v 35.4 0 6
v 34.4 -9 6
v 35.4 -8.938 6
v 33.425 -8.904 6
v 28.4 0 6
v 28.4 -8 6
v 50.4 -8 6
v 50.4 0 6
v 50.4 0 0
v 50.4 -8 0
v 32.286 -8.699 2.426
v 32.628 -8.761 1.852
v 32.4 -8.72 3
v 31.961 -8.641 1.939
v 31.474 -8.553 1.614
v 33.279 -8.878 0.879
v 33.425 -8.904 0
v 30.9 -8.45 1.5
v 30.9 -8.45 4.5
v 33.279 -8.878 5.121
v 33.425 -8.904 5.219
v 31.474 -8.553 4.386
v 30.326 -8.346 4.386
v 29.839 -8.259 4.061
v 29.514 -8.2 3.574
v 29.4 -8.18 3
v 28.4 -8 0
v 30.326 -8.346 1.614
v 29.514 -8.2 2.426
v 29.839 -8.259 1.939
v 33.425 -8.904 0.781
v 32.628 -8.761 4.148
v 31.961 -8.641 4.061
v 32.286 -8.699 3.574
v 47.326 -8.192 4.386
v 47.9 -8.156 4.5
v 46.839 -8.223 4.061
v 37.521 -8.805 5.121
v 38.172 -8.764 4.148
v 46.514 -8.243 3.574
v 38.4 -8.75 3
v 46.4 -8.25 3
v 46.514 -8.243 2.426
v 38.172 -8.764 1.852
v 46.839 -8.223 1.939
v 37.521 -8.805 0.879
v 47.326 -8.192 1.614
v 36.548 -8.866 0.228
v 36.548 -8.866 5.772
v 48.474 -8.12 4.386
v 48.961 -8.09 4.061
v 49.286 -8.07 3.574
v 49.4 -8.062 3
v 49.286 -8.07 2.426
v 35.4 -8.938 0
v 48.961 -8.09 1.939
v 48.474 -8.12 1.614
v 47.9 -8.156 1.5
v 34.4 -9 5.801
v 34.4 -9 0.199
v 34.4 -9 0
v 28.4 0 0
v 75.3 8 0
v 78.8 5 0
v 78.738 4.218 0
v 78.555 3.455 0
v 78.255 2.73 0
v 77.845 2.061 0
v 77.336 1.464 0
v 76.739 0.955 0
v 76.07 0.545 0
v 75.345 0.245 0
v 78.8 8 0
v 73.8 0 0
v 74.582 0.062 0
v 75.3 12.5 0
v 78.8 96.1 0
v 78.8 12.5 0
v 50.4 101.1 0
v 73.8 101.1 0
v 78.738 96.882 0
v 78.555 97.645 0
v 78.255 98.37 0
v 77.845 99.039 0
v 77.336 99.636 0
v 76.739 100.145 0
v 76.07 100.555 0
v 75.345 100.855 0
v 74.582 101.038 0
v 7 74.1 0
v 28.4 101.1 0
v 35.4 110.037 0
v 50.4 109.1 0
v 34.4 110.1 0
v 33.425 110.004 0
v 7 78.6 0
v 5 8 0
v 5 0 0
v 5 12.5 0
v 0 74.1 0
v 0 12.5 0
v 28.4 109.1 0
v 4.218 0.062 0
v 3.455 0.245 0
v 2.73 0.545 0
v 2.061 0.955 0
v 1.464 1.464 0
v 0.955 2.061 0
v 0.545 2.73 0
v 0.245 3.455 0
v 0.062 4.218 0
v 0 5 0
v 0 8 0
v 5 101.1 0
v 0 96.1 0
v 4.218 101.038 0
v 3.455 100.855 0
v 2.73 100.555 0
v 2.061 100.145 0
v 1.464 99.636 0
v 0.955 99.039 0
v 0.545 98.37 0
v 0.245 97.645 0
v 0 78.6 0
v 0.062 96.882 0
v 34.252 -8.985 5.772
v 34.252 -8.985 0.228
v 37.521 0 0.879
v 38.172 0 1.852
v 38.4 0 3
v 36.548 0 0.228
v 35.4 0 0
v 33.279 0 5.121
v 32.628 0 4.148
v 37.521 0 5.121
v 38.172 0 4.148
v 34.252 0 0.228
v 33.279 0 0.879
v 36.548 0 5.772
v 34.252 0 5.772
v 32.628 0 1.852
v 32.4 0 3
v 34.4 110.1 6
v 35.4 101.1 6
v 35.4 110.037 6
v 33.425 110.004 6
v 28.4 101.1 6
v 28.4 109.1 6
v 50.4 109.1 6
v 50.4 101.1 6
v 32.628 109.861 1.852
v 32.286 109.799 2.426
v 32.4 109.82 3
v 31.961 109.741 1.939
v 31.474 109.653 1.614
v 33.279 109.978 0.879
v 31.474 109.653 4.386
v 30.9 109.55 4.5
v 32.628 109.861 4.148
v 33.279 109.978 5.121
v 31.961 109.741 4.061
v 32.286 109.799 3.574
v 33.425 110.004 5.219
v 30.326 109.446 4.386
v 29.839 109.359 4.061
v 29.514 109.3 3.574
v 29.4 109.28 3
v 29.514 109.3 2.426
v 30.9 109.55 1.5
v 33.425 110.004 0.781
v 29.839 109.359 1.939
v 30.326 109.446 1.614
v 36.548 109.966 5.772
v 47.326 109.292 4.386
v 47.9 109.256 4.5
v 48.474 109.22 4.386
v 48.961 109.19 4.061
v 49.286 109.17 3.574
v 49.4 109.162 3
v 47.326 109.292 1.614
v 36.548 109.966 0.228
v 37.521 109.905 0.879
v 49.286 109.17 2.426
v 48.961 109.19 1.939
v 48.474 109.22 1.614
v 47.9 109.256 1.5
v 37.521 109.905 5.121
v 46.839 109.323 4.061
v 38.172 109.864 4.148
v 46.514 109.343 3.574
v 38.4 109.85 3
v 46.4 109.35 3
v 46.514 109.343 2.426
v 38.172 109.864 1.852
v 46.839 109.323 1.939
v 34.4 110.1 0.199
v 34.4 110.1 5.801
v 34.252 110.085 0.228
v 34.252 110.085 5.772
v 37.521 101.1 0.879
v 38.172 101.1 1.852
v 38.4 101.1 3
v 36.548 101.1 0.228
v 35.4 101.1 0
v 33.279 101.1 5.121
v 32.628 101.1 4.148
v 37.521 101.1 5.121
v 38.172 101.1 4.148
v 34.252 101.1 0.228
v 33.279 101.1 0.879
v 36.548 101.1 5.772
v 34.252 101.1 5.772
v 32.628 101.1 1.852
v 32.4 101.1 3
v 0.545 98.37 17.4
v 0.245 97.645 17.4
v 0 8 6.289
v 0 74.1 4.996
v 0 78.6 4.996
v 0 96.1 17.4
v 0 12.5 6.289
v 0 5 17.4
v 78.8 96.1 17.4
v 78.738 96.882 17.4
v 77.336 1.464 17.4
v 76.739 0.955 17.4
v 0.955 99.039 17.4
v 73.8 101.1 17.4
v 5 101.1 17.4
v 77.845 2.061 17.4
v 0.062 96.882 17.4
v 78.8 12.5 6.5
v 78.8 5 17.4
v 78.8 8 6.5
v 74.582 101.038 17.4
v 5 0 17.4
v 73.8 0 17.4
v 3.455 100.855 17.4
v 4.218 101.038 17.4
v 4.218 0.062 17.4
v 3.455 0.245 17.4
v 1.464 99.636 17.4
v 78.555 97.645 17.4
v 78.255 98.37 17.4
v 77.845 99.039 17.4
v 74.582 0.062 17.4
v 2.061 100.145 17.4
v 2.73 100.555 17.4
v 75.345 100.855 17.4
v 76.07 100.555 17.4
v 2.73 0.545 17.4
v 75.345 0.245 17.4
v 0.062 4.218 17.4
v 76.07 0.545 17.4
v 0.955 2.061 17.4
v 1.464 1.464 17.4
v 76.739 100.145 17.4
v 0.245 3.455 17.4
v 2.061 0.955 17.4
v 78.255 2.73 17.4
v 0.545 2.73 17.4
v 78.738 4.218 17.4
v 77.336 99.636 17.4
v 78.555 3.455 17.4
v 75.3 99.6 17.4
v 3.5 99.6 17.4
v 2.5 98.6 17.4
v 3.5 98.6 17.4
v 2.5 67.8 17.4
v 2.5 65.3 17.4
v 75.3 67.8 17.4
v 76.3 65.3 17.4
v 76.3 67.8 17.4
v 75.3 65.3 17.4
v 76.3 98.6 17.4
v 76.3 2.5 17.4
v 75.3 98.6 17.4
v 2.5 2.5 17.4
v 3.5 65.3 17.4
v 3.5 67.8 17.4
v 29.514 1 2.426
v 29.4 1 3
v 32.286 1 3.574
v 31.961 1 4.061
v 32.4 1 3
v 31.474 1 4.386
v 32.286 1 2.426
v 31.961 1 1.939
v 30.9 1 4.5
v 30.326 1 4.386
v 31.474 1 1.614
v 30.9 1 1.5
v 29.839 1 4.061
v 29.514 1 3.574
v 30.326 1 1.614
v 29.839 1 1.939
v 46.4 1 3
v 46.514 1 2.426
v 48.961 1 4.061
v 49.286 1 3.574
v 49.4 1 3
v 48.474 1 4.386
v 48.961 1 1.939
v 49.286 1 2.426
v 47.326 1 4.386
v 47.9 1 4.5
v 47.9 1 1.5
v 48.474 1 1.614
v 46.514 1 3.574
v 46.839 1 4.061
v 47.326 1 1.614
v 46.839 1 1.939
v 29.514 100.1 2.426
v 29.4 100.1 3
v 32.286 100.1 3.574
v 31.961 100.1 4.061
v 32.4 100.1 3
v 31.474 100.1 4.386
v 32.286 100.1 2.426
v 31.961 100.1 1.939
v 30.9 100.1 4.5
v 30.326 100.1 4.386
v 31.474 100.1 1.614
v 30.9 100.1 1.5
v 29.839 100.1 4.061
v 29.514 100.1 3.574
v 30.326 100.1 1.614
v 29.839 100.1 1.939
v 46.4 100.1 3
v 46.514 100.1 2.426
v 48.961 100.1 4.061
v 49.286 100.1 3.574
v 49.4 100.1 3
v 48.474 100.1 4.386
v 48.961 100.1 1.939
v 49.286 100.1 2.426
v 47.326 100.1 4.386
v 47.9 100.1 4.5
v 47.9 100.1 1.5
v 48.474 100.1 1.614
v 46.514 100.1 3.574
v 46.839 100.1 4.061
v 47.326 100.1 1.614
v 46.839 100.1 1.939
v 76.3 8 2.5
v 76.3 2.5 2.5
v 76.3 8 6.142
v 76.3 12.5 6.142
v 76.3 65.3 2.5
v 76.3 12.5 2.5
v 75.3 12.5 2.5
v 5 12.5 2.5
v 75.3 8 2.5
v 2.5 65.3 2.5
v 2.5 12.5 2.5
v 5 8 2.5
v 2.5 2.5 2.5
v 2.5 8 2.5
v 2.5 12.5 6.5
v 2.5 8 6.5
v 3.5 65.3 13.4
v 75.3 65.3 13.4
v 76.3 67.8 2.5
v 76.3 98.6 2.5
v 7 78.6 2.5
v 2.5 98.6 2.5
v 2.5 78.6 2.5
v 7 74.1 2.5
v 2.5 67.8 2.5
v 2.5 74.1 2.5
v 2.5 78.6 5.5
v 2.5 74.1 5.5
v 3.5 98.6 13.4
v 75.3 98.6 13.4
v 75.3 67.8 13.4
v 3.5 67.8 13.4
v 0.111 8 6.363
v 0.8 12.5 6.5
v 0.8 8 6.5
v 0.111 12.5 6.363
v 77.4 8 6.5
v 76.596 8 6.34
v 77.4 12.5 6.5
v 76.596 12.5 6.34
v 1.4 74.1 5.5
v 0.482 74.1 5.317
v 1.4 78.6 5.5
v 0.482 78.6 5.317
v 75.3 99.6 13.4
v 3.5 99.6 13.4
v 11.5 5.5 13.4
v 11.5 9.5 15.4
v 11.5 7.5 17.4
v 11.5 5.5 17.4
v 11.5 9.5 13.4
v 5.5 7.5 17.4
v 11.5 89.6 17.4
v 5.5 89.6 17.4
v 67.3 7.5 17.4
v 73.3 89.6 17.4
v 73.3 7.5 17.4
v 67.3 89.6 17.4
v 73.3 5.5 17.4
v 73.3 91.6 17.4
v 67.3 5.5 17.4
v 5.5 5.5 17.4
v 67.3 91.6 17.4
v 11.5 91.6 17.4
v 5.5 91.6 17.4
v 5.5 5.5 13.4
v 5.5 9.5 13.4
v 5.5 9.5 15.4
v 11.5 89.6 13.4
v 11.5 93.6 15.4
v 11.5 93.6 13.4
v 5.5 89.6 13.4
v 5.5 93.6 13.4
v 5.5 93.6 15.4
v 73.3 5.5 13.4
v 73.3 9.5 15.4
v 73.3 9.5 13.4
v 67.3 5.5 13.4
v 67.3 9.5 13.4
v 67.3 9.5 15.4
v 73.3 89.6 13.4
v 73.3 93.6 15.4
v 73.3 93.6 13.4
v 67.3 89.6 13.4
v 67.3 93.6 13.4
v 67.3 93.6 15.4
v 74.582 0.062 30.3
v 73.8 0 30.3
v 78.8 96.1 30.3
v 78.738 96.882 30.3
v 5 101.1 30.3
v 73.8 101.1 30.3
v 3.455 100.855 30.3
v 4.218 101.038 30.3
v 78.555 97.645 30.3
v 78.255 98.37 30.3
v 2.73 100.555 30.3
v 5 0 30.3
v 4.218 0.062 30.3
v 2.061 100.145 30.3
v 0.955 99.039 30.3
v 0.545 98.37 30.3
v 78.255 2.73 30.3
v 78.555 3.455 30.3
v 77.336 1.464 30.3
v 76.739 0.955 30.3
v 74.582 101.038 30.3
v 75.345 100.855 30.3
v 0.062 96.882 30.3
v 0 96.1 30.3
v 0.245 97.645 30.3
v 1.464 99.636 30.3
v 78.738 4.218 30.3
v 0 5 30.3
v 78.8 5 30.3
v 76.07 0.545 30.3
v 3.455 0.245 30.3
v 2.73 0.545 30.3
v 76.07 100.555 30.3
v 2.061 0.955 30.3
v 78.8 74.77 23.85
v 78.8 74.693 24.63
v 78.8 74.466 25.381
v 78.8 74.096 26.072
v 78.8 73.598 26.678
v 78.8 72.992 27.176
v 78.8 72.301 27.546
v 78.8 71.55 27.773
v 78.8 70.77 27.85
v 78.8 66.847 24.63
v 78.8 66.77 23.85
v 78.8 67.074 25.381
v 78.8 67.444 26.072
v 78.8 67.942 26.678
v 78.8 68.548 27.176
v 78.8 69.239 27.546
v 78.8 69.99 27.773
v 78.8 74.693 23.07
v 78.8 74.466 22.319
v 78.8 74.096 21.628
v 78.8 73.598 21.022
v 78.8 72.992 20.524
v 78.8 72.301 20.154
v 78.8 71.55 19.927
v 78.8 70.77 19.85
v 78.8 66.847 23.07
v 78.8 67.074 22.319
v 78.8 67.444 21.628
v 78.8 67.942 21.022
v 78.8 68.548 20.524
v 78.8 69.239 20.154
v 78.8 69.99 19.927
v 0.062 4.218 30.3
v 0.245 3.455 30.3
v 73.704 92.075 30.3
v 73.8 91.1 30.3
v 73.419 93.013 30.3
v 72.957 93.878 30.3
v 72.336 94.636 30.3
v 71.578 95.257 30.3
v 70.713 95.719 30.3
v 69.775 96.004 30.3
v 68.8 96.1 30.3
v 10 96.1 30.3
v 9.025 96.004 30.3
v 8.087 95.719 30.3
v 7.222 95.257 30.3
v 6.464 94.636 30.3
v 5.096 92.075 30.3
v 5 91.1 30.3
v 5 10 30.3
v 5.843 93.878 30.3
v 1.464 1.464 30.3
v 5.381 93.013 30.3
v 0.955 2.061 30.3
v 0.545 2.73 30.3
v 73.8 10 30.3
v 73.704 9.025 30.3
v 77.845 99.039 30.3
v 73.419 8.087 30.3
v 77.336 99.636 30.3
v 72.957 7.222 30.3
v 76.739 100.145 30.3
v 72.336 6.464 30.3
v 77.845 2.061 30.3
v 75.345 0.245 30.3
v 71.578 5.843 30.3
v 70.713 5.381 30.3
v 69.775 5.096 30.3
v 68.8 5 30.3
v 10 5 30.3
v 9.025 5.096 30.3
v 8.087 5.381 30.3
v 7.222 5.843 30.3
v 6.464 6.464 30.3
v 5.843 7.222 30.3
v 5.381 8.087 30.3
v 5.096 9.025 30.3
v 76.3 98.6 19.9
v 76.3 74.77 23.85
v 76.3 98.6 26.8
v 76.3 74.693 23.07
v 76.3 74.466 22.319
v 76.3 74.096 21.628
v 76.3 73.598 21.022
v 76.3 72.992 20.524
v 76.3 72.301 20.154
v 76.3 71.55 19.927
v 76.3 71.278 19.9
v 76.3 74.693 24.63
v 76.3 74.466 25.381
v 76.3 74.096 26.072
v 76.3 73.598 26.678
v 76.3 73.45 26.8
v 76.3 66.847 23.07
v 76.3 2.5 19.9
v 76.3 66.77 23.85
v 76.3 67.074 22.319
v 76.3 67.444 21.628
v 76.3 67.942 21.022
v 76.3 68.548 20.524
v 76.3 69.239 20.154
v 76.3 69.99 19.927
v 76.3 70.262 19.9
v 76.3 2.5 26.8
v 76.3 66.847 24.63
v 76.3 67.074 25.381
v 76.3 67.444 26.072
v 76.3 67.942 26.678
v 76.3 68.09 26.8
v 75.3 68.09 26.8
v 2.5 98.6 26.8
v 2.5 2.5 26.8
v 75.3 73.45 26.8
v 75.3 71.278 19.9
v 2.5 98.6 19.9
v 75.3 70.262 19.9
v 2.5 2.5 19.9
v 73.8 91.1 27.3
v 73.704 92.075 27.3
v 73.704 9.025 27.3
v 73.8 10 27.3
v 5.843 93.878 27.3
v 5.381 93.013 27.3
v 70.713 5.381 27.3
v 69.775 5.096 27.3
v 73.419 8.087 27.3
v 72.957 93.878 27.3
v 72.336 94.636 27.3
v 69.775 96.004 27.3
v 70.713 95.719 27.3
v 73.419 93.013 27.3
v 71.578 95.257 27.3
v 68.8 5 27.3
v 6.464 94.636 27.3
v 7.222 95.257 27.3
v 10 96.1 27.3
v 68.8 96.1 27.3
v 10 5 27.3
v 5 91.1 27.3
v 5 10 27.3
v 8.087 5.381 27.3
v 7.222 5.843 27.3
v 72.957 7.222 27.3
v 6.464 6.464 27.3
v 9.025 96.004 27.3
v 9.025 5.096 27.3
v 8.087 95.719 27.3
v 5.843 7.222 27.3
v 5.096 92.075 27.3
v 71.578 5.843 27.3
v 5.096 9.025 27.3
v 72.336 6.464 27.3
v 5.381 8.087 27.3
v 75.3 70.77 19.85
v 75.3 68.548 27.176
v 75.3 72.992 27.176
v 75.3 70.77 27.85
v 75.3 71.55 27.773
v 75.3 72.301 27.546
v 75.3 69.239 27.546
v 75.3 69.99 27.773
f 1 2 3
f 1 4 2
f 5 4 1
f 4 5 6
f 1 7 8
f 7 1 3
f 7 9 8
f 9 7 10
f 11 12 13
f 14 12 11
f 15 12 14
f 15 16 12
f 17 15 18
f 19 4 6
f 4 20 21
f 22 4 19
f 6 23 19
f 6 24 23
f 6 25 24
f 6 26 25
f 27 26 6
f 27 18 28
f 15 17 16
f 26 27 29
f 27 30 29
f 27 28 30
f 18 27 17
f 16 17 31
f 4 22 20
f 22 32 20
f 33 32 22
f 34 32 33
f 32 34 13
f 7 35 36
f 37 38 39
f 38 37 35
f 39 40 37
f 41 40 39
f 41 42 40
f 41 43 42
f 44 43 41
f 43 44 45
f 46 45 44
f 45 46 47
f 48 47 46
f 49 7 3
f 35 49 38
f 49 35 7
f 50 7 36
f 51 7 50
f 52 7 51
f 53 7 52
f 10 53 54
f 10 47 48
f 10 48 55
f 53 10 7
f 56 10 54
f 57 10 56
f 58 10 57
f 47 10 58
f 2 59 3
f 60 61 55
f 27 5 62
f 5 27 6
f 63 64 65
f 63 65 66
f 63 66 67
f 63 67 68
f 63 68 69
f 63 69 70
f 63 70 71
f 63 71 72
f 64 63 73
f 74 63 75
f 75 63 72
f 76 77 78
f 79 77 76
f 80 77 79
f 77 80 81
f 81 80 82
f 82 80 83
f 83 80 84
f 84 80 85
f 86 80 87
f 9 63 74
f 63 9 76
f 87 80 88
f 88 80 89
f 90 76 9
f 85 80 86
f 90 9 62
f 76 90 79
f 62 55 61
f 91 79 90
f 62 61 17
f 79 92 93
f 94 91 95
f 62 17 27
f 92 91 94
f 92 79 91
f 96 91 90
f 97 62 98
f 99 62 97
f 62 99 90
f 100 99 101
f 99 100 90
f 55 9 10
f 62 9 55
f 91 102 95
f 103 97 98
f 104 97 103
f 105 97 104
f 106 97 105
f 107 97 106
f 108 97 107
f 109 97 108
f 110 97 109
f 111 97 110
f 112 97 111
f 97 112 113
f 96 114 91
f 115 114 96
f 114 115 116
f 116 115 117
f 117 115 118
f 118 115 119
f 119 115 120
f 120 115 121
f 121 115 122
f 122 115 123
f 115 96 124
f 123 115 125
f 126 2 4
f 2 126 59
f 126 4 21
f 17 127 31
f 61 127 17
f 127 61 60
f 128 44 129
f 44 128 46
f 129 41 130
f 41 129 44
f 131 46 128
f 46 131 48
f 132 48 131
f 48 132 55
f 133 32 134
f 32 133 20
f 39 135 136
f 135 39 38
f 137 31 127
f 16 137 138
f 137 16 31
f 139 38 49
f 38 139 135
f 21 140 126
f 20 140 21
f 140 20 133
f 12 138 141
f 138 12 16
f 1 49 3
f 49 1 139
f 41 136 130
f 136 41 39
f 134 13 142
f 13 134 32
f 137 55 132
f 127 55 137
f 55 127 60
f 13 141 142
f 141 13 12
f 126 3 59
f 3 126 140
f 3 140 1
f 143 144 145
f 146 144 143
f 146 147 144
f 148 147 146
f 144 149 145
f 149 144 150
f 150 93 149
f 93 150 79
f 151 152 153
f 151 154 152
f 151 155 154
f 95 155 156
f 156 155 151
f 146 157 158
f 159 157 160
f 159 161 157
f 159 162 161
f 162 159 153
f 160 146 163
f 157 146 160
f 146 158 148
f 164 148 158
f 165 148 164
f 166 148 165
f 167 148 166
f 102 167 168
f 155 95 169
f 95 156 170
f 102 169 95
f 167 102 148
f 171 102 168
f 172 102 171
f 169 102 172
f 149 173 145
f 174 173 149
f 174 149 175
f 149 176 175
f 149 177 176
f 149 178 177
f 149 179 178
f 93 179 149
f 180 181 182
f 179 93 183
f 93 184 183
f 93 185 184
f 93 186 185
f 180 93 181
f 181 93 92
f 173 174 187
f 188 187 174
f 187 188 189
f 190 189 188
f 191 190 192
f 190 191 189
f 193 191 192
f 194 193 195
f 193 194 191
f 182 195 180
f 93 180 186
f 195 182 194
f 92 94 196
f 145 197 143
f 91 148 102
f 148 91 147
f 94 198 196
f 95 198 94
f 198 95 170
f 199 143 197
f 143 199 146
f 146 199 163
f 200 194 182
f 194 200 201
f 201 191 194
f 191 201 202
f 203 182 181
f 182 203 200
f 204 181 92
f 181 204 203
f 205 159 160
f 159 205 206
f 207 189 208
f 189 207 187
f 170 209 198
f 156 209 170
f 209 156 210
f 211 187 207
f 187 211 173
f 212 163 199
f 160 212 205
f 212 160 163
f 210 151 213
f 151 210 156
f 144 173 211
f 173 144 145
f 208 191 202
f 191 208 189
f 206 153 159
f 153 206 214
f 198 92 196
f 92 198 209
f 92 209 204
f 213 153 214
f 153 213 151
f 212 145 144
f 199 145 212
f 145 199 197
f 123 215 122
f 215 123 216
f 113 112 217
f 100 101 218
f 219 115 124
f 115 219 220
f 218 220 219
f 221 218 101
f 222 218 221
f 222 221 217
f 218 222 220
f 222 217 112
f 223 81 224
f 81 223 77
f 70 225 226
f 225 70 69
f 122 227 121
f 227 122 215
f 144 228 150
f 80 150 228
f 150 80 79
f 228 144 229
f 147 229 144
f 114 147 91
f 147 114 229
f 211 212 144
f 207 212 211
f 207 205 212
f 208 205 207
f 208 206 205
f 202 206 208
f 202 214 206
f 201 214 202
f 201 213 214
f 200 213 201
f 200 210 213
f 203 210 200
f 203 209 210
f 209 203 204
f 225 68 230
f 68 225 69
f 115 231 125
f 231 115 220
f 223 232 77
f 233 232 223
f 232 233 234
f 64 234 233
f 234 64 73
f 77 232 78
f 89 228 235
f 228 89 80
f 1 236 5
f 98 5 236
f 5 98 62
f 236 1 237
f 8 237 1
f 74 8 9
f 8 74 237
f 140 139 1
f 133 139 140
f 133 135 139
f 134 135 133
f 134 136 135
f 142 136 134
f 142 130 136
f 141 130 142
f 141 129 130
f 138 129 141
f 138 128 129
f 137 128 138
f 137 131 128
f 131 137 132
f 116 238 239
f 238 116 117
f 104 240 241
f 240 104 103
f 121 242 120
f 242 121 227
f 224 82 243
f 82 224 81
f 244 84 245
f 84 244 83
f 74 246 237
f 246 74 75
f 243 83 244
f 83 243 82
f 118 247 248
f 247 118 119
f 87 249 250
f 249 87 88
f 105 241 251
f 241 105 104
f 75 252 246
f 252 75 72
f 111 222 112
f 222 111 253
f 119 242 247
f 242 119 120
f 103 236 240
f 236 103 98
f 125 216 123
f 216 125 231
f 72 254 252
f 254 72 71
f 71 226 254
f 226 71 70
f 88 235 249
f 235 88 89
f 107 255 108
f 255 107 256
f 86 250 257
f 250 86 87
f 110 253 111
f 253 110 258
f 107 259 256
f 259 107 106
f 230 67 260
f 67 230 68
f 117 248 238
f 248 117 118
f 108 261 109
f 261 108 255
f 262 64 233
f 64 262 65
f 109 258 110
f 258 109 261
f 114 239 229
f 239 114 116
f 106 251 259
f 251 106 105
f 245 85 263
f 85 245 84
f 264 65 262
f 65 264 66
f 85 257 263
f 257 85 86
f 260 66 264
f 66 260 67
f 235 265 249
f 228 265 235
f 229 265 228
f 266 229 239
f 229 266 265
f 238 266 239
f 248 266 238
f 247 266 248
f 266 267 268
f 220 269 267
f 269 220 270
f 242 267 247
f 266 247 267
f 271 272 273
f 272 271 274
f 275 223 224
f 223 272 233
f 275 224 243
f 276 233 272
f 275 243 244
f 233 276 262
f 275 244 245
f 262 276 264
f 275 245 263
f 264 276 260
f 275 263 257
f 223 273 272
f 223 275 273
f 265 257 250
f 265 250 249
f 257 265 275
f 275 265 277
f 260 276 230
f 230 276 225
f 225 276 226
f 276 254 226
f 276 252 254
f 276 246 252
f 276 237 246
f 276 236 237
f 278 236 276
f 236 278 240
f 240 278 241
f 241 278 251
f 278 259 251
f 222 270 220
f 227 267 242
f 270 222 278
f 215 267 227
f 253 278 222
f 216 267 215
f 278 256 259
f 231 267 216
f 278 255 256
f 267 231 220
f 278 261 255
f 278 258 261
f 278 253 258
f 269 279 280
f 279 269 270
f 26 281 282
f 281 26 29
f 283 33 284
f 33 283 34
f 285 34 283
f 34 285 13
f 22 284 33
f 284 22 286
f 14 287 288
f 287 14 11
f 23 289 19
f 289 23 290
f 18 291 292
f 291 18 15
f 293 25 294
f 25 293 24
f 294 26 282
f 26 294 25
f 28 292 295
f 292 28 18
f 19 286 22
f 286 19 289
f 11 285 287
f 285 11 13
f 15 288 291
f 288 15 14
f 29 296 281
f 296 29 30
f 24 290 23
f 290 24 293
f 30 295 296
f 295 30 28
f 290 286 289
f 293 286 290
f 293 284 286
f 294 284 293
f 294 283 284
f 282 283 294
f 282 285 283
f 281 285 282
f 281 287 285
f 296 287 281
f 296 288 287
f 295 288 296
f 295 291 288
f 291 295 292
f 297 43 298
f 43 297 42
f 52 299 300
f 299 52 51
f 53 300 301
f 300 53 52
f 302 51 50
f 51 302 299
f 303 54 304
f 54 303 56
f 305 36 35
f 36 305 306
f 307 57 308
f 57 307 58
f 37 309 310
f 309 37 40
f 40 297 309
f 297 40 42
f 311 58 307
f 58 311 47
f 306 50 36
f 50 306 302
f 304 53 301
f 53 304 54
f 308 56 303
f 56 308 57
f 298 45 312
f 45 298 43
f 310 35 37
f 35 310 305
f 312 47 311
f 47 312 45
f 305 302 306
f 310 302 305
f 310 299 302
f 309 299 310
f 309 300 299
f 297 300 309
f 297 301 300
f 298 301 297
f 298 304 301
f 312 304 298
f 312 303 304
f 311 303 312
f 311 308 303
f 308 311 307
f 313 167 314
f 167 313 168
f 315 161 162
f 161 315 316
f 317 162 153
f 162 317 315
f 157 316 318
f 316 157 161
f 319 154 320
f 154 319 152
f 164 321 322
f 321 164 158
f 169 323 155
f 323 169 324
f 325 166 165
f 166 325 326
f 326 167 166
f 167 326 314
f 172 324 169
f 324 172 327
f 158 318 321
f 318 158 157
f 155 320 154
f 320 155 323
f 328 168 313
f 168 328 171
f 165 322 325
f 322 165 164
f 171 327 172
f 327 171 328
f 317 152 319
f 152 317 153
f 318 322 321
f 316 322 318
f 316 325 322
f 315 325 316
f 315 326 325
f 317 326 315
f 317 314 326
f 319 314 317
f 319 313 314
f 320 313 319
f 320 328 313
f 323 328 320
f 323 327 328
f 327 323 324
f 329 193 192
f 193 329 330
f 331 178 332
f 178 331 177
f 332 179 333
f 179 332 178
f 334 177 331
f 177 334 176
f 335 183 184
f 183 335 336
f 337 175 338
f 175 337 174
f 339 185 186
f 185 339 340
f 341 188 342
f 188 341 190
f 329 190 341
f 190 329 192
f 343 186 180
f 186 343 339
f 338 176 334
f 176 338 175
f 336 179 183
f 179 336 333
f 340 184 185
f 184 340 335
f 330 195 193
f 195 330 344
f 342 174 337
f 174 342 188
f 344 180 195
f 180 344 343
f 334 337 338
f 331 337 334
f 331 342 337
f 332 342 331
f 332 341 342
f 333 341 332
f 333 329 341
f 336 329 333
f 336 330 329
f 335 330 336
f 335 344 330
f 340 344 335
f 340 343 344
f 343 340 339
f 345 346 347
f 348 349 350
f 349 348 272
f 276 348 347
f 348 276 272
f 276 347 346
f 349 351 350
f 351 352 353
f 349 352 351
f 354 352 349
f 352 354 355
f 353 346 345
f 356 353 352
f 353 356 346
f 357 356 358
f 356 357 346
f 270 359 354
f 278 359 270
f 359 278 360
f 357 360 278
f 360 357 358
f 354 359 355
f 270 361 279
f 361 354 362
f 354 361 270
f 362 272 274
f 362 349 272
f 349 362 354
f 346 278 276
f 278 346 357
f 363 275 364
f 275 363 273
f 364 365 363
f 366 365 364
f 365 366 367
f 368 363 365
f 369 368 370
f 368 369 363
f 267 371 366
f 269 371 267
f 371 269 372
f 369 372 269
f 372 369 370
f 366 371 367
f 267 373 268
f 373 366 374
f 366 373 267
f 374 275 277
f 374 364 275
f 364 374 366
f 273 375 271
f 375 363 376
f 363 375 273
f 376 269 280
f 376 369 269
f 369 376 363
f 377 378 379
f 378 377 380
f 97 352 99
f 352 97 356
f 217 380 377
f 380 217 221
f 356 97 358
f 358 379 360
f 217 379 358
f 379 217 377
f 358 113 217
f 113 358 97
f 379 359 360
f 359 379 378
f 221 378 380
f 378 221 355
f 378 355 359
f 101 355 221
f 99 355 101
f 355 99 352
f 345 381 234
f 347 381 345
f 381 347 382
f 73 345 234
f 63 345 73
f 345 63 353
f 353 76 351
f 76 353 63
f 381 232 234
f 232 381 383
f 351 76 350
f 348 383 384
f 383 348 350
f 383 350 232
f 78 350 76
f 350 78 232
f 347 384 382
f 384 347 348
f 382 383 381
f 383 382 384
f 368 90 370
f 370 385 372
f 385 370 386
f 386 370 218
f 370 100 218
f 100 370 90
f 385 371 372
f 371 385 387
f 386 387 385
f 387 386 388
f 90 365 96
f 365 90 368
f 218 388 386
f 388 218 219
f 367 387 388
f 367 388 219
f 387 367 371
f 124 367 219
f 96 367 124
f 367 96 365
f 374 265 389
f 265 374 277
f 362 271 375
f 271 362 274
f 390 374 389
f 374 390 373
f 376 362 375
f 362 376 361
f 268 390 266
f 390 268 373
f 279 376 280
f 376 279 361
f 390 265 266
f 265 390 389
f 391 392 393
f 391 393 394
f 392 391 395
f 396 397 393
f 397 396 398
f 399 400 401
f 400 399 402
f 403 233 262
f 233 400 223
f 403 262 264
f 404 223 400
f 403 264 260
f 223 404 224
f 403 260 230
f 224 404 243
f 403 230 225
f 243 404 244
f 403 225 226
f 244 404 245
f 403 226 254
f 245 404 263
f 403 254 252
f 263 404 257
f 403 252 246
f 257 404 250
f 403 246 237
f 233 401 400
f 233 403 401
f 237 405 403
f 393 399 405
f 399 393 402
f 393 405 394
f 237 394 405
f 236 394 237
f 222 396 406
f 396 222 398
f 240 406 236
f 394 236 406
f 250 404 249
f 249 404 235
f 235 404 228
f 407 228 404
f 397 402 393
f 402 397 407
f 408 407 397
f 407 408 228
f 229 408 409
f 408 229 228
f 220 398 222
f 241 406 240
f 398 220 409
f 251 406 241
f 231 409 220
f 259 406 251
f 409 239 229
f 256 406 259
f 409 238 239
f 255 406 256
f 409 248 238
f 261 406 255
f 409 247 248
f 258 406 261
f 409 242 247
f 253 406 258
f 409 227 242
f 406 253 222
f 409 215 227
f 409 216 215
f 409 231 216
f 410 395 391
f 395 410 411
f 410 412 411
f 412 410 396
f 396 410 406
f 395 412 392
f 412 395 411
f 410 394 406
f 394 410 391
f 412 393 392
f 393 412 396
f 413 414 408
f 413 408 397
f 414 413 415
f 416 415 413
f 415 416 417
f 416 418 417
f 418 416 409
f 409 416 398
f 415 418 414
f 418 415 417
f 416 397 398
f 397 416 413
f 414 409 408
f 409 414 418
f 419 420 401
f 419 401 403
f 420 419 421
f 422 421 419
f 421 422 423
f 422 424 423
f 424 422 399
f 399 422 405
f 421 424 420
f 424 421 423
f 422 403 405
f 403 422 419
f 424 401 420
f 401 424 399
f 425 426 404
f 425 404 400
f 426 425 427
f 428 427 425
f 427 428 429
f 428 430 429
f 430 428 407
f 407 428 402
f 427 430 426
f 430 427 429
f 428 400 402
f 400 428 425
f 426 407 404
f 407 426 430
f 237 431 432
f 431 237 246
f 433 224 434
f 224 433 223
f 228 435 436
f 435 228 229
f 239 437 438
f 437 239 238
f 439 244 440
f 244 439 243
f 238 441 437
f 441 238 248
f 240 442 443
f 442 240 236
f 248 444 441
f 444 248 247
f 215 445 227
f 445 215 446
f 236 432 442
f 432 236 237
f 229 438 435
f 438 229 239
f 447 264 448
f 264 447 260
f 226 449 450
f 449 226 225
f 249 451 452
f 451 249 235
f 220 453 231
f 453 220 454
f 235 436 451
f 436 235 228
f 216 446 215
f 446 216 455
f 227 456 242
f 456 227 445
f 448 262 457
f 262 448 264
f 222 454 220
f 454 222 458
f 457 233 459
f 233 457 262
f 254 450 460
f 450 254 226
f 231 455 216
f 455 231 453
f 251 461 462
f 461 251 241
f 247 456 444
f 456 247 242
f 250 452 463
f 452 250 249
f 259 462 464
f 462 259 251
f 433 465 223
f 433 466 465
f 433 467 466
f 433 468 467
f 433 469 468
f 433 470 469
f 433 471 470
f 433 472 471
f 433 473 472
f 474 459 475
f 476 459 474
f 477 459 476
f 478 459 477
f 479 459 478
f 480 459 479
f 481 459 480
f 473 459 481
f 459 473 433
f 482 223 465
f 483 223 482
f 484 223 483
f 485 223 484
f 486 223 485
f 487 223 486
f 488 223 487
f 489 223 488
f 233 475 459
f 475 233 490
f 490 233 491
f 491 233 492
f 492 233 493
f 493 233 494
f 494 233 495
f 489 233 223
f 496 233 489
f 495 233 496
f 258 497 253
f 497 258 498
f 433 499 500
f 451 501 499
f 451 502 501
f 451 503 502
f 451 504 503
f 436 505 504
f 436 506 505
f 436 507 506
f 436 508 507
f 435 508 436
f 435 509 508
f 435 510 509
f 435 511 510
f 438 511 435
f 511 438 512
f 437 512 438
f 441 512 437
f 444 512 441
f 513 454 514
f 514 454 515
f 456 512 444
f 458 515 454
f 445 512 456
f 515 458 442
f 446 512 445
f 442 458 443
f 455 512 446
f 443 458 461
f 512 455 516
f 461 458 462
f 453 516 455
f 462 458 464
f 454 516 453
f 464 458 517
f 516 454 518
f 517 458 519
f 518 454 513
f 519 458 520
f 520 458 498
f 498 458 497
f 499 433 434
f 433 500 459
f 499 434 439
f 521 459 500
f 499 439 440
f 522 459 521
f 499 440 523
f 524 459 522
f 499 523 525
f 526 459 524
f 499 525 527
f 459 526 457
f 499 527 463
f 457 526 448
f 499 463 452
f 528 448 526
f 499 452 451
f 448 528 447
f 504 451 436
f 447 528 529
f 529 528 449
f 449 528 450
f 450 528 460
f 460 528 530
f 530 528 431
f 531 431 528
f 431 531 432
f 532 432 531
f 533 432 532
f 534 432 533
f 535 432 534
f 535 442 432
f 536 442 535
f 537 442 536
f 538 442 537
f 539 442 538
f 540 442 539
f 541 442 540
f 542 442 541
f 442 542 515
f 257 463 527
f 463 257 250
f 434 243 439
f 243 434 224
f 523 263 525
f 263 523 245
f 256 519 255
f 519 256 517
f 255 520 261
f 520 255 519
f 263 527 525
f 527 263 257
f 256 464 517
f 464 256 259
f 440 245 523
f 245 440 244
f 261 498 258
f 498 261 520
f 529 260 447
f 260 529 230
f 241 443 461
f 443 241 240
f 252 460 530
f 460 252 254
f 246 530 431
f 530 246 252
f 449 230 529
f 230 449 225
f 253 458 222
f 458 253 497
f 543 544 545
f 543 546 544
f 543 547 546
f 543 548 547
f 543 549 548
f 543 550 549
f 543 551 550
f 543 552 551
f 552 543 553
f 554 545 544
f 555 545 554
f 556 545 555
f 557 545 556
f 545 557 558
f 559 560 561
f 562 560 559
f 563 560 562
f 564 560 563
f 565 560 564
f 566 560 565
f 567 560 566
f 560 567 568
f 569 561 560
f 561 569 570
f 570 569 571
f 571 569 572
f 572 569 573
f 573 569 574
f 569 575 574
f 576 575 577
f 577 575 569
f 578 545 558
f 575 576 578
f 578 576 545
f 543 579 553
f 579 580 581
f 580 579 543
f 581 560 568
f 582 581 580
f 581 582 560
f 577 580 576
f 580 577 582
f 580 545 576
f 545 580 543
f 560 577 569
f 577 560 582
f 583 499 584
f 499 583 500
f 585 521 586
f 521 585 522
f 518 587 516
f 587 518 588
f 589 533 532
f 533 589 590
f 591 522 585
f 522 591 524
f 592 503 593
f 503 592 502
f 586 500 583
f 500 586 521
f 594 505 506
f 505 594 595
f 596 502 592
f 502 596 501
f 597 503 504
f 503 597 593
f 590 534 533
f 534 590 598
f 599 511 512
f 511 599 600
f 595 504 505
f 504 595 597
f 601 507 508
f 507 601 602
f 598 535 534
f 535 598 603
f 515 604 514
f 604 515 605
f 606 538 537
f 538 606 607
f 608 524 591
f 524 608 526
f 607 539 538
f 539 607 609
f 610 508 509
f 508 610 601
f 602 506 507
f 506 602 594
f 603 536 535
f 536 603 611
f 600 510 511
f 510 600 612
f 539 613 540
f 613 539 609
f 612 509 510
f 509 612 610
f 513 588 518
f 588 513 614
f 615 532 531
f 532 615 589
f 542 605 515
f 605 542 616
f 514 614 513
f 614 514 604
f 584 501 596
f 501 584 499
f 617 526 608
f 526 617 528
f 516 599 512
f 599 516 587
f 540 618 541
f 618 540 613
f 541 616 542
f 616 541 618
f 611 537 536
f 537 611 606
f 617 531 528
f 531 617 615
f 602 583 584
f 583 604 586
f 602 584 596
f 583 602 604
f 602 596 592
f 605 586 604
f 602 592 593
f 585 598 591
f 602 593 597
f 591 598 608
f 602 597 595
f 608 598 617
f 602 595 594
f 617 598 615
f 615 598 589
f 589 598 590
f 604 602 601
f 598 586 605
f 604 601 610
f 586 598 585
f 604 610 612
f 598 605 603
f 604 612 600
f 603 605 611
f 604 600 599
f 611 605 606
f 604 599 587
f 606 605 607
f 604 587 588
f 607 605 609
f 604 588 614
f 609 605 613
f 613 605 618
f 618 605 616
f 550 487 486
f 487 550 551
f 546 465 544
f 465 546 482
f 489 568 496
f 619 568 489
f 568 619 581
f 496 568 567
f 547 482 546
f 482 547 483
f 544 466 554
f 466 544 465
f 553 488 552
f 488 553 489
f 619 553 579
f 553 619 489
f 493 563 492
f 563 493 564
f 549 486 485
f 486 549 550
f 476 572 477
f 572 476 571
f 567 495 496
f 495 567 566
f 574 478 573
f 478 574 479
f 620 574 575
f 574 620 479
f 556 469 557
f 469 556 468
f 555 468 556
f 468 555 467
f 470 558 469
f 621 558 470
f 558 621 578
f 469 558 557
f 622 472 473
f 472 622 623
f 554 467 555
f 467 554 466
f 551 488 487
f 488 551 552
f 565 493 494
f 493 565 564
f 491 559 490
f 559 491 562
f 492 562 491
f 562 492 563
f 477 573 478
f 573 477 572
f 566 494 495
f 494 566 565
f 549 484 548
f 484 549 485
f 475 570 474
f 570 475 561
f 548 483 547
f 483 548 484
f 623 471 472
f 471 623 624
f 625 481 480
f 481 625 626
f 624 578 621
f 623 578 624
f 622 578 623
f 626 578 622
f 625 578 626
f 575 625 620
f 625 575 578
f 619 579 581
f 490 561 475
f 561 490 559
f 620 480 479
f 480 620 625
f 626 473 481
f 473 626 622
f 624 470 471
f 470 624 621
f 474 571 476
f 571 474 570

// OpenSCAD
// ============================================================
//  GlucoFit — 워치형 통합 케이스
//  Pi Zero 2W + 보조배터리 일체형 / 뚜껑 스냅핏 + 손목 러그
//
//  출력 방법:
//    1. OpenSCAD에서 이 파일 열기
//    2. 아래 PRINT_PART 값 바꿔서 각각 STL 내보내기
//       PRINT_PART = 0  →  전체 미리보기 (조립 확인용)
//       PRINT_PART = 1  →  바텀 케이스만 출력
//       PRINT_PART = 2  →  뚜껑(탑 리드)만 출력
//    3. F6 Render → File > Export as STL
//    4. Cura: PLA, 레이어 0.2mm, 인필 25%, 서포트 없음
// ============================================================

/* [출력 파트 선택] */
PRINT_PART = 0;   // 0=전체보기  1=바텀  2=탑 리드

/* [보조배터리 실측값 (mm)] */
// 샤오미 10000 Pro 기준 — 구매 후 실측 필수
PB_W = 73.0;   // 가로
PB_D = 62.0;   // 세로
PB_H = 14.5;   // 두께

/* [Pi Zero 2W] */
PI_W = 65.0;
PI_D = 30.0;
PI_H = 6.0;    // PCB + 부품 여유

/* [케이스 설정] */
WALL      = 2.5;   // 벽 두께
GAP       = 0.4;   // 조립 공차
R         = 5.0;   // 모서리 곡률 (워치 느낌)
LUG_W     = 22.0;  // 러그 폭 (표준 손목 밴드 22mm)
LUG_D     = 8.0;   // 러그 길이
LUG_H     = 6.0;   // 러그 두께
LUG_PIN_R = 1.5;   // 러그 핀 구멍 반지름 (스프링바 대응)
CLIP_H    = 4.0;   // 스냅핏 클립 높이

// ============================================================
//  내부 계산
// ============================================================
INNER_W = max(PB_W, PI_W) + GAP * 2;
INNER_D = PB_D + GAP * 2 + PI_D + GAP * 2 + WALL;  // 배터리 + Pi 나란히
INNER_H_BOT = PB_H + GAP;          // 바텀 내부 깊이 (배터리 층)
INNER_H_TOP = PI_H + GAP;          // 탑 내부 깊이 (Pi 층)

OUTER_W = INNER_W + WALL * 2;
OUTER_D = INNER_D + WALL * 2;
BOT_H   = INNER_H_BOT + WALL;      // 바텀 케이스 전체 높이
TOP_H   = INNER_H_TOP + WALL + CLIP_H; // 탑 리드 전체 높이

// ============================================================
//  어셈블리 출력
// ============================================================
if (PRINT_PART == 0) {
    // 조립 미리보기
    color("SteelBlue")   bottom_case();
    color("LightSteelBlue", 0.7)
    translate([0, 0, BOT_H])
    top_lid();
}
else if (PRINT_PART == 1) {
    bottom_case();
}
else if (PRINT_PART == 2) {
    // 뒤집어서 출력 (평평한 면이 베드에 닿게)
    translate([0, OUTER_D, TOP_H])
    rotate([180, 0, 0])
    top_lid();
}

// ============================================================
//  바텀 케이스 (배터리 + 케이블 구멍 + 러그)
// ============================================================
module bottom_case() {
    difference() {
        union() {
            // 케이스 바디
            rounded_box(OUTER_W, OUTER_D, BOT_H, R);

            // 손목 러그 — 상하 4개
            for (side = [-1, 1])
            for (end  = [0, 1]) {
                lug_y = end == 0 ? -LUG_D : OUTER_D;
                translate([OUTER_W / 2 - LUG_W / 2, lug_y, 0])
                lug(side);
            }
        }

        // 내부 공간 (배터리 슬롯)
        translate([WALL, WALL, WALL])
        cube([INNER_W, PB_D + GAP * 2, INNER_H_BOT + 1]);

        // Pi 공간 (배터리 옆)
        translate([WALL, WALL + PB_D + GAP * 2 + WALL, WALL])
        cube([INNER_W, PI_D + GAP * 2, INNER_H_BOT + 1]);

        // micro-USB 전원 구멍 (배터리 측면 왼쪽)
        translate([-1, WALL + 10, WALL + 4])
        rotate([0, 90, 0])
        rounded_hole(12, 6, WALL + 2);

        // USB-A 출력 구멍 (배터리 측면 오른쪽)
        translate([OUTER_W - WALL - 1, WALL + 10, WALL + 4])
        rotate([0, 90, 0])
        rounded_hole(14, 7, WALL + 2);

        // mini-HDMI 구멍 (Pi 쪽 측면)
        translate([-1, OUTER_D - WALL - 20, WALL + 3])
        rotate([0, 90, 0])
        rounded_hole(16, 8, WALL + 2);

        // 스냅핏 홈 (상단 테두리 안쪽)
        translate([WALL + 1, WALL + 1, BOT_H - CLIP_H])
        cube([INNER_W - 2, INNER_D, CLIP_H + 1]);

        // 러그 핀 구멍
        for (side = [-1, 1])
        for (end  = [0, 1]) {
            lug_y = end == 0
                ? -LUG_D + LUG_D / 2
                : OUTER_D + LUG_D / 2;
            for (x_pos = [OUTER_W / 2 - LUG_W / 2 + LUG_PIN_R + 1,
                           OUTER_W / 2 + LUG_W / 2 - LUG_PIN_R - 1])
            translate([x_pos, lug_y, LUG_H / 2])
            rotate([90, 0, 0])
            cylinder(h = LUG_D + 2, r = LUG_PIN_R, $fn = 16, center = true);
        }
    }

    // 스냅핏 돌기 (바텀 상단 모서리 4군데)
    for (x = [WALL + 3, OUTER_W - WALL - 3 - 6])
    for (y = [WALL + 3, OUTER_D - WALL - 3 - 6])
    translate([x, y, BOT_H - CLIP_H])
    snap_peg();
}

// ============================================================
//  탑 리드 (Pi 덮개 + 스냅핏 클립)
// ============================================================
module top_lid() {
    difference() {
        union() {
            // 리드 바디
            rounded_box(OUTER_W, OUTER_D, TOP_H, R);

            // 내부 스냅핏 클립 (바텀 돌기에 끼워짐)
            for (x = [WALL + 3, OUTER_W - WALL - 3 - 6])
            for (y = [WALL + 3, OUTER_D - WALL - 3 - 6])
            translate([x, y, TOP_H - CLIP_H - WALL - PI_H - GAP])
            snap_clip_socket();
        }

        // 내부 공간 (Pi 수납)
        translate([WALL, WALL, WALL])
        cube([INNER_W, INNER_D, INNER_H_TOP + 0.5]);

        // 투명창 자리 (워치 페이스 느낌 — 글라스 끼우거나 오픈)
        translate([OUTER_W / 2, OUTER_D / 2, TOP_H - WALL - 0.5])
        scale([1, 1, 1])
        hull() {
            for (dx = [-OUTER_W / 2 + WALL * 2 + R,
                        OUTER_W / 2 - WALL * 2 - R])
            for (dy = [-OUTER_D / 2 + WALL * 2 + R,
                        OUTER_D / 2 - WALL * 2 - R])
            translate([dx, dy, 0])
            cylinder(h = WALL + 1, r = R, $fn = 32);
        }

        // 전원 버튼 구멍 (우측 상단)
        translate([OUTER_W - WALL - 1, OUTER_D * 0.7, TOP_H / 2])
        rotate([0, 90, 0])
        cylinder(h = WALL + 2, r = 4, $fn = 32);
    }
}

// ============================================================
//  헬퍼 모듈
// ============================================================

// 라운드 박스
module rounded_box(w, d, h, r) {
    hull()
    for (x = [r, w - r])
    for (y = [r, d - r])
    translate([x, y, 0])
    cylinder(h = h, r = r, $fn = 40);
}

// 라운드 구멍 (케이블 포트)
module rounded_hole(w, h, depth) {
    r = min(w, h) / 2 * 0.6;
    hull()
    for (x = [r, w - r])
    for (z = [r, h - r])
    translate([x, 0, z])
    rotate([90, 0, 0])
    cylinder(h = depth, r = r, $fn = 16);
}

// 손목 러그
module lug(side) {
    difference() {
        hull() {
            cube([LUG_W, LUG_D, LUG_H]);
            translate([LUG_W / 2 - R, LUG_D / 2, 0])
            cylinder(h = LUG_H, r = R, $fn = 32);
        }
        // 경량화 컷
        translate([LUG_W / 2 - 4, -1, LUG_H / 2])
        rotate([-90, 0, 0])
        cylinder(h = LUG_D + 2, r = 3, $fn = 16);
    }
}

// 스냅핏 돌기 (바텀)
module snap_peg() {
    w = 6; d = 4; h = CLIP_H;
    difference() {
        cube([w, d, h]);
        // 빗면 — 뚜껑 누를 때 탄성으로 밀림
        translate([0, d, h - 2])
        rotate([45, 0, 0])
        cube([w, 3, 3]);
    }
}

// 스냅핏 소켓 (탑 리드)
module snap_clip_socket() {
    w = 6 + GAP * 2;
    d = 4 + GAP * 2;
    h = CLIP_H + 1;
    // 바깥 벽
    difference() {
        translate([-GAP, -GAP, 0])
        cube([w + WALL, d + WALL, h]);
        // 소켓 내부
        cube([w, d, h + 1]);
    }
}
